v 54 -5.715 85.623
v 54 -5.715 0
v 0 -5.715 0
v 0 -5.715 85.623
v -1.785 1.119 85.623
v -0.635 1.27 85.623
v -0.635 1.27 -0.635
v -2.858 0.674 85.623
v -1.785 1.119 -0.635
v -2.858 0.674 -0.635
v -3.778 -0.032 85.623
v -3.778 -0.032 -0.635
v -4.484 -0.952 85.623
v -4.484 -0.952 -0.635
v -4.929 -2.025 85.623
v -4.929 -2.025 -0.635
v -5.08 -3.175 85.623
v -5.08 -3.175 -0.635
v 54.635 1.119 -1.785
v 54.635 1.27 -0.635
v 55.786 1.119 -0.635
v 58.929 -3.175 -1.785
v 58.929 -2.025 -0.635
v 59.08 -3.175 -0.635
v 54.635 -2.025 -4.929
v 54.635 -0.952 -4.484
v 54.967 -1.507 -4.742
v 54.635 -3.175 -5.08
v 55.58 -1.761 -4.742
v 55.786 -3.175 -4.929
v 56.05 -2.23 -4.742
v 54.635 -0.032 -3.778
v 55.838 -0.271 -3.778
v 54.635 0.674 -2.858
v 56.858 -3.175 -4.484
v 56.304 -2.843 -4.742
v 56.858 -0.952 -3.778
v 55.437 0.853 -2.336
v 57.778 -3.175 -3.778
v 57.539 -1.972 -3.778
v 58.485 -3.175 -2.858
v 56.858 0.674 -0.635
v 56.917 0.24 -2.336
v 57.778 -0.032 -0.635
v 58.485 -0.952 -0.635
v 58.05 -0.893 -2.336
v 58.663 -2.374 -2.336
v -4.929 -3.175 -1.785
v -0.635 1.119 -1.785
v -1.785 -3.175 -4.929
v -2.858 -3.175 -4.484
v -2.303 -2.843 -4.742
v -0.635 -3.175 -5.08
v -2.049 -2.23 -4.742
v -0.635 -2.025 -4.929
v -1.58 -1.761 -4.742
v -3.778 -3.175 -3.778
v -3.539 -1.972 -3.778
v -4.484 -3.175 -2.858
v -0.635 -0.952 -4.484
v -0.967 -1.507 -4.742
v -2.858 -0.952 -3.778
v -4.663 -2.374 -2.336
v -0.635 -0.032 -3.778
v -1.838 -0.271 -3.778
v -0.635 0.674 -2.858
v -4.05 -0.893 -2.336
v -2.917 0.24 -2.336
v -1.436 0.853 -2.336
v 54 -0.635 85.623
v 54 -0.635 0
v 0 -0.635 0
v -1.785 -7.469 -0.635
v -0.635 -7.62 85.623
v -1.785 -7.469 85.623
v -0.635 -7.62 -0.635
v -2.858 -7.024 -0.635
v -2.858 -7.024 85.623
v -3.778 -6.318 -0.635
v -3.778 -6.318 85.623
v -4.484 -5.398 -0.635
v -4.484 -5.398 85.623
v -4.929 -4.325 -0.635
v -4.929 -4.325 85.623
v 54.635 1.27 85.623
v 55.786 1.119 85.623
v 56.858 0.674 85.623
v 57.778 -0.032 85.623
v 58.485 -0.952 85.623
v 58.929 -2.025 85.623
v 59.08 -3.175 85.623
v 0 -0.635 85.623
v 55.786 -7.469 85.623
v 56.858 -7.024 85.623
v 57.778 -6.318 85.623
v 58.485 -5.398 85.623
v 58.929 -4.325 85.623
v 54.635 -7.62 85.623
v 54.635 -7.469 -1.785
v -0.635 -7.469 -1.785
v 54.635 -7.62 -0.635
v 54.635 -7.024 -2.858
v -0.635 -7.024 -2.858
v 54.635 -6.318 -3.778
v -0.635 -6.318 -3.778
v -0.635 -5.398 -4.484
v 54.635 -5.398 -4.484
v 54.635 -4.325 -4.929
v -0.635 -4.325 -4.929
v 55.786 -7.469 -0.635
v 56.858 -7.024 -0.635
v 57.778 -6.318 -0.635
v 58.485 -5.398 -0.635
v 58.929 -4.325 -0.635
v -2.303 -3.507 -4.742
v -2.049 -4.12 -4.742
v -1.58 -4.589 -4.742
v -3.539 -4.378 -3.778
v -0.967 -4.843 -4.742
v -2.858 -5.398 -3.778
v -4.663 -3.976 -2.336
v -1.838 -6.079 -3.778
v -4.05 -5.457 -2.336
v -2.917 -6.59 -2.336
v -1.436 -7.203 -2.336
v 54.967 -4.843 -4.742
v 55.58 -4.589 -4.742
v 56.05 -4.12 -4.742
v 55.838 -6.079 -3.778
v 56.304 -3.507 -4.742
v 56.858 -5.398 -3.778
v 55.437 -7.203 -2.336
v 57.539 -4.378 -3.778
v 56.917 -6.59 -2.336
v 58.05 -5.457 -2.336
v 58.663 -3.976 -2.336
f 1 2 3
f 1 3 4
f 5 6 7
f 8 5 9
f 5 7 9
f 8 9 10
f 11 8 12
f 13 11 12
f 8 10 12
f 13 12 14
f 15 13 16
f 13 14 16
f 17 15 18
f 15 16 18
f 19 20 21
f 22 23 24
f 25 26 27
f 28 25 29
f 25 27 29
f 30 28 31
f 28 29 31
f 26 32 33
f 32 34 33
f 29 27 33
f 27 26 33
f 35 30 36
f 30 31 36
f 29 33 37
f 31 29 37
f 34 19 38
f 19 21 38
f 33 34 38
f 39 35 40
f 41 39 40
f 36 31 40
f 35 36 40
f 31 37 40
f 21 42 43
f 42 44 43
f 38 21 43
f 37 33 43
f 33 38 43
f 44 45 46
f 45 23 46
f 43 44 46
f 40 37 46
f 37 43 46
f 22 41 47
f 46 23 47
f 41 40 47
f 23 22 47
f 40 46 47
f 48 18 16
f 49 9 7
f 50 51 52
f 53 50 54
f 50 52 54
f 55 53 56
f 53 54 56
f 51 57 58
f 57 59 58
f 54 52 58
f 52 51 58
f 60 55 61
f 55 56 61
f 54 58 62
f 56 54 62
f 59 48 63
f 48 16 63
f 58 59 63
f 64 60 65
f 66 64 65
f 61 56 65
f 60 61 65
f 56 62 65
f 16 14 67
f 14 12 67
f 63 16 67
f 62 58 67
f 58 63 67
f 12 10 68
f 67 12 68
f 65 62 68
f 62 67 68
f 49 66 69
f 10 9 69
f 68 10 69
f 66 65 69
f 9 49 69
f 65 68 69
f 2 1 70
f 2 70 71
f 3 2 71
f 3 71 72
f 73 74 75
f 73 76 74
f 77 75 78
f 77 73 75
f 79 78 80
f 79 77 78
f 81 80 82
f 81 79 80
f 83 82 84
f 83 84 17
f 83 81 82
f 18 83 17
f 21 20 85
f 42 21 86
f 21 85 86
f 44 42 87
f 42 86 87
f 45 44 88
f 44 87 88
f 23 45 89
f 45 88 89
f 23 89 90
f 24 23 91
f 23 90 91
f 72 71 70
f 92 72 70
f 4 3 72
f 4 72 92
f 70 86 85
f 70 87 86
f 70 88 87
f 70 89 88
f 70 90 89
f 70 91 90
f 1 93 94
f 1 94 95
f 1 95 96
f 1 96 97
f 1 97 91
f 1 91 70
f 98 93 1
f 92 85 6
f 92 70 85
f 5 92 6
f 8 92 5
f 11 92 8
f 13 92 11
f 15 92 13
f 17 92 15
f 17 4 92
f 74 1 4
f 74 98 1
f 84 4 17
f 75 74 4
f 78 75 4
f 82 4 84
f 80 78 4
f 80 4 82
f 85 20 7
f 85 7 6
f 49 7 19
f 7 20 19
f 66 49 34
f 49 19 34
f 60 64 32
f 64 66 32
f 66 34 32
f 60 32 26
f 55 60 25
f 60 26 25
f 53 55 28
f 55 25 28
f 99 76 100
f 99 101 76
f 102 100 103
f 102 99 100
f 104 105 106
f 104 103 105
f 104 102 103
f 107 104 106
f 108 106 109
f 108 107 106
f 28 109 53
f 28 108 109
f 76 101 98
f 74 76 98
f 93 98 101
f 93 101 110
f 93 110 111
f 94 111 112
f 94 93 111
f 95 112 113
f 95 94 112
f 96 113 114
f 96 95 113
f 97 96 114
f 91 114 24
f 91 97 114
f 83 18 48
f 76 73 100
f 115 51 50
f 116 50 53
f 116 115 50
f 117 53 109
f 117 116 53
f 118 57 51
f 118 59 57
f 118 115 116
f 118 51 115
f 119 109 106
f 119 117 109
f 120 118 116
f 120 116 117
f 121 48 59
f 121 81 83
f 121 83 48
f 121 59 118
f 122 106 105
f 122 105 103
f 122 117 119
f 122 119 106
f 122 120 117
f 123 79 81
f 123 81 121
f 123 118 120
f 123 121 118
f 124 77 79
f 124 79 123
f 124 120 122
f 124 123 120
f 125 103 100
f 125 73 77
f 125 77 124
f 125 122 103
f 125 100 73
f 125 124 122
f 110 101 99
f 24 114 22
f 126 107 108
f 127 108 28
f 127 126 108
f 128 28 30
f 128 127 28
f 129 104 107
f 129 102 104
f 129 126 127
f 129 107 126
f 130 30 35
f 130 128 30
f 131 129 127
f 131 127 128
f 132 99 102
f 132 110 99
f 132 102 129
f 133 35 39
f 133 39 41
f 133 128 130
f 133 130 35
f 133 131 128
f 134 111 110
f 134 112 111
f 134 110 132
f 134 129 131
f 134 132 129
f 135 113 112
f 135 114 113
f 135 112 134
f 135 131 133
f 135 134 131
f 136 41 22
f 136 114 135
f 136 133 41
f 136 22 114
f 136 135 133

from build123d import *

# Parameters (mm, degrees)
F1_DEPTH  = 6.35
F2_DEPTH  = 1.27
F3_W      = 1.27
F3_H      = 85.6234
F4_DEPTH  = 54.0004
F5_DEPTH  = 1.27
F6_W      = 1.27
F6_H      = 85.6234
F7_DEPTH  = 54.0004
F8_R      = 4.44499
F9_DEPTH  = 0.635
F10_DEPTH = 0.635


# Not quite as in the source:
# - a fillet or chamfer is up to 0.001 mm smaller than in the source, because OpenCascade refuses the exact size


with BuildPart() as f1:
    # F0 (on Front) → F1 (new body)
    with BuildSketch(Plane.XZ):
        Polygon((54.0004, 0), (0, 0), (0, 85.6234), (-5.08, 85.6234), (-5.08, 0), (-5.08, -5.08), (0, -5.08), (54.0004, -5.08), (59.0804, -5.08), (59.0804, 0), (59.0804, 85.6234), (54.0004, 85.6234), align=None)
    extrude(amount=F1_DEPTH)

    # F2 (add): a face of the model
    f2_faces = [f1.faces().sort_by_distance(p)[0] for p in [
        (27.0002, -6.35, -3.9689795817),
    ]]
    extrude(f2_faces, amount=F2_DEPTH)

    # F3 (on face) → F4 (join)
    with BuildSketch(Plane(origin=(54.0004, 0, 0), x_dir=(0, -1, 0), z_dir=(-1, 0, 0))):
        with Locations((6.985, 42.8117)):
            Rectangle(F3_W, F3_H)
    extrude(amount=F4_DEPTH)

    # F5 (add): a face of the model
    f5_faces = [f1.faces().sort_by_distance(p)[0] for p in [
        (27.0002, 0, -3.9689795817),
    ]]
    extrude(f5_faces, amount=F5_DEPTH)

    # F6 (on face) → F7 (join)
    with BuildSketch(Plane(origin=(54.0004, 0, 0), x_dir=(0, -1, 0), z_dir=(-1, 0, 0))):
        with Locations((-0.635, 42.8117)):
            Rectangle(F6_W, F6_H)
    extrude(amount=F7_DEPTH)

    # F8 (radius 4.445 in the source; OpenCascade refuses exactly that, so slightly less here)
    f8_edges = [f1.edges().sort_by_distance(p)[0] for p in [
        (-5.08, -7.62, 40.2717),
        (-5.08, 1.27, 40.2717),
        (59.0804, 1.27, 40.2717),
        (59.0804, -7.62, 40.2717),
        (-5.08, -3.175, -5.08),
        (27.0002, 1.27, -5.08),
        (27.0002, -7.62, -5.08),
        (59.0804, -3.175, -5.08),
    ]]
    fillet(f8_edges, radius=F8_R)

    # F9 (add): a face of the model
    f9_faces = [f1.faces().sort_by_distance(p)[0] for p in [
        (27.0002, 0, 42.8117),
    ]]
    extrude(f9_faces, amount=F9_DEPTH)

    # F10 (add): a face of the model
    f10_faces = [f1.faces().sort_by_distance(p)[0] for p in [
        (27.0002, -6.35, 42.8117),
    ]]
    extrude(f10_faces, amount=F10_DEPTH)


solid = f1.part
